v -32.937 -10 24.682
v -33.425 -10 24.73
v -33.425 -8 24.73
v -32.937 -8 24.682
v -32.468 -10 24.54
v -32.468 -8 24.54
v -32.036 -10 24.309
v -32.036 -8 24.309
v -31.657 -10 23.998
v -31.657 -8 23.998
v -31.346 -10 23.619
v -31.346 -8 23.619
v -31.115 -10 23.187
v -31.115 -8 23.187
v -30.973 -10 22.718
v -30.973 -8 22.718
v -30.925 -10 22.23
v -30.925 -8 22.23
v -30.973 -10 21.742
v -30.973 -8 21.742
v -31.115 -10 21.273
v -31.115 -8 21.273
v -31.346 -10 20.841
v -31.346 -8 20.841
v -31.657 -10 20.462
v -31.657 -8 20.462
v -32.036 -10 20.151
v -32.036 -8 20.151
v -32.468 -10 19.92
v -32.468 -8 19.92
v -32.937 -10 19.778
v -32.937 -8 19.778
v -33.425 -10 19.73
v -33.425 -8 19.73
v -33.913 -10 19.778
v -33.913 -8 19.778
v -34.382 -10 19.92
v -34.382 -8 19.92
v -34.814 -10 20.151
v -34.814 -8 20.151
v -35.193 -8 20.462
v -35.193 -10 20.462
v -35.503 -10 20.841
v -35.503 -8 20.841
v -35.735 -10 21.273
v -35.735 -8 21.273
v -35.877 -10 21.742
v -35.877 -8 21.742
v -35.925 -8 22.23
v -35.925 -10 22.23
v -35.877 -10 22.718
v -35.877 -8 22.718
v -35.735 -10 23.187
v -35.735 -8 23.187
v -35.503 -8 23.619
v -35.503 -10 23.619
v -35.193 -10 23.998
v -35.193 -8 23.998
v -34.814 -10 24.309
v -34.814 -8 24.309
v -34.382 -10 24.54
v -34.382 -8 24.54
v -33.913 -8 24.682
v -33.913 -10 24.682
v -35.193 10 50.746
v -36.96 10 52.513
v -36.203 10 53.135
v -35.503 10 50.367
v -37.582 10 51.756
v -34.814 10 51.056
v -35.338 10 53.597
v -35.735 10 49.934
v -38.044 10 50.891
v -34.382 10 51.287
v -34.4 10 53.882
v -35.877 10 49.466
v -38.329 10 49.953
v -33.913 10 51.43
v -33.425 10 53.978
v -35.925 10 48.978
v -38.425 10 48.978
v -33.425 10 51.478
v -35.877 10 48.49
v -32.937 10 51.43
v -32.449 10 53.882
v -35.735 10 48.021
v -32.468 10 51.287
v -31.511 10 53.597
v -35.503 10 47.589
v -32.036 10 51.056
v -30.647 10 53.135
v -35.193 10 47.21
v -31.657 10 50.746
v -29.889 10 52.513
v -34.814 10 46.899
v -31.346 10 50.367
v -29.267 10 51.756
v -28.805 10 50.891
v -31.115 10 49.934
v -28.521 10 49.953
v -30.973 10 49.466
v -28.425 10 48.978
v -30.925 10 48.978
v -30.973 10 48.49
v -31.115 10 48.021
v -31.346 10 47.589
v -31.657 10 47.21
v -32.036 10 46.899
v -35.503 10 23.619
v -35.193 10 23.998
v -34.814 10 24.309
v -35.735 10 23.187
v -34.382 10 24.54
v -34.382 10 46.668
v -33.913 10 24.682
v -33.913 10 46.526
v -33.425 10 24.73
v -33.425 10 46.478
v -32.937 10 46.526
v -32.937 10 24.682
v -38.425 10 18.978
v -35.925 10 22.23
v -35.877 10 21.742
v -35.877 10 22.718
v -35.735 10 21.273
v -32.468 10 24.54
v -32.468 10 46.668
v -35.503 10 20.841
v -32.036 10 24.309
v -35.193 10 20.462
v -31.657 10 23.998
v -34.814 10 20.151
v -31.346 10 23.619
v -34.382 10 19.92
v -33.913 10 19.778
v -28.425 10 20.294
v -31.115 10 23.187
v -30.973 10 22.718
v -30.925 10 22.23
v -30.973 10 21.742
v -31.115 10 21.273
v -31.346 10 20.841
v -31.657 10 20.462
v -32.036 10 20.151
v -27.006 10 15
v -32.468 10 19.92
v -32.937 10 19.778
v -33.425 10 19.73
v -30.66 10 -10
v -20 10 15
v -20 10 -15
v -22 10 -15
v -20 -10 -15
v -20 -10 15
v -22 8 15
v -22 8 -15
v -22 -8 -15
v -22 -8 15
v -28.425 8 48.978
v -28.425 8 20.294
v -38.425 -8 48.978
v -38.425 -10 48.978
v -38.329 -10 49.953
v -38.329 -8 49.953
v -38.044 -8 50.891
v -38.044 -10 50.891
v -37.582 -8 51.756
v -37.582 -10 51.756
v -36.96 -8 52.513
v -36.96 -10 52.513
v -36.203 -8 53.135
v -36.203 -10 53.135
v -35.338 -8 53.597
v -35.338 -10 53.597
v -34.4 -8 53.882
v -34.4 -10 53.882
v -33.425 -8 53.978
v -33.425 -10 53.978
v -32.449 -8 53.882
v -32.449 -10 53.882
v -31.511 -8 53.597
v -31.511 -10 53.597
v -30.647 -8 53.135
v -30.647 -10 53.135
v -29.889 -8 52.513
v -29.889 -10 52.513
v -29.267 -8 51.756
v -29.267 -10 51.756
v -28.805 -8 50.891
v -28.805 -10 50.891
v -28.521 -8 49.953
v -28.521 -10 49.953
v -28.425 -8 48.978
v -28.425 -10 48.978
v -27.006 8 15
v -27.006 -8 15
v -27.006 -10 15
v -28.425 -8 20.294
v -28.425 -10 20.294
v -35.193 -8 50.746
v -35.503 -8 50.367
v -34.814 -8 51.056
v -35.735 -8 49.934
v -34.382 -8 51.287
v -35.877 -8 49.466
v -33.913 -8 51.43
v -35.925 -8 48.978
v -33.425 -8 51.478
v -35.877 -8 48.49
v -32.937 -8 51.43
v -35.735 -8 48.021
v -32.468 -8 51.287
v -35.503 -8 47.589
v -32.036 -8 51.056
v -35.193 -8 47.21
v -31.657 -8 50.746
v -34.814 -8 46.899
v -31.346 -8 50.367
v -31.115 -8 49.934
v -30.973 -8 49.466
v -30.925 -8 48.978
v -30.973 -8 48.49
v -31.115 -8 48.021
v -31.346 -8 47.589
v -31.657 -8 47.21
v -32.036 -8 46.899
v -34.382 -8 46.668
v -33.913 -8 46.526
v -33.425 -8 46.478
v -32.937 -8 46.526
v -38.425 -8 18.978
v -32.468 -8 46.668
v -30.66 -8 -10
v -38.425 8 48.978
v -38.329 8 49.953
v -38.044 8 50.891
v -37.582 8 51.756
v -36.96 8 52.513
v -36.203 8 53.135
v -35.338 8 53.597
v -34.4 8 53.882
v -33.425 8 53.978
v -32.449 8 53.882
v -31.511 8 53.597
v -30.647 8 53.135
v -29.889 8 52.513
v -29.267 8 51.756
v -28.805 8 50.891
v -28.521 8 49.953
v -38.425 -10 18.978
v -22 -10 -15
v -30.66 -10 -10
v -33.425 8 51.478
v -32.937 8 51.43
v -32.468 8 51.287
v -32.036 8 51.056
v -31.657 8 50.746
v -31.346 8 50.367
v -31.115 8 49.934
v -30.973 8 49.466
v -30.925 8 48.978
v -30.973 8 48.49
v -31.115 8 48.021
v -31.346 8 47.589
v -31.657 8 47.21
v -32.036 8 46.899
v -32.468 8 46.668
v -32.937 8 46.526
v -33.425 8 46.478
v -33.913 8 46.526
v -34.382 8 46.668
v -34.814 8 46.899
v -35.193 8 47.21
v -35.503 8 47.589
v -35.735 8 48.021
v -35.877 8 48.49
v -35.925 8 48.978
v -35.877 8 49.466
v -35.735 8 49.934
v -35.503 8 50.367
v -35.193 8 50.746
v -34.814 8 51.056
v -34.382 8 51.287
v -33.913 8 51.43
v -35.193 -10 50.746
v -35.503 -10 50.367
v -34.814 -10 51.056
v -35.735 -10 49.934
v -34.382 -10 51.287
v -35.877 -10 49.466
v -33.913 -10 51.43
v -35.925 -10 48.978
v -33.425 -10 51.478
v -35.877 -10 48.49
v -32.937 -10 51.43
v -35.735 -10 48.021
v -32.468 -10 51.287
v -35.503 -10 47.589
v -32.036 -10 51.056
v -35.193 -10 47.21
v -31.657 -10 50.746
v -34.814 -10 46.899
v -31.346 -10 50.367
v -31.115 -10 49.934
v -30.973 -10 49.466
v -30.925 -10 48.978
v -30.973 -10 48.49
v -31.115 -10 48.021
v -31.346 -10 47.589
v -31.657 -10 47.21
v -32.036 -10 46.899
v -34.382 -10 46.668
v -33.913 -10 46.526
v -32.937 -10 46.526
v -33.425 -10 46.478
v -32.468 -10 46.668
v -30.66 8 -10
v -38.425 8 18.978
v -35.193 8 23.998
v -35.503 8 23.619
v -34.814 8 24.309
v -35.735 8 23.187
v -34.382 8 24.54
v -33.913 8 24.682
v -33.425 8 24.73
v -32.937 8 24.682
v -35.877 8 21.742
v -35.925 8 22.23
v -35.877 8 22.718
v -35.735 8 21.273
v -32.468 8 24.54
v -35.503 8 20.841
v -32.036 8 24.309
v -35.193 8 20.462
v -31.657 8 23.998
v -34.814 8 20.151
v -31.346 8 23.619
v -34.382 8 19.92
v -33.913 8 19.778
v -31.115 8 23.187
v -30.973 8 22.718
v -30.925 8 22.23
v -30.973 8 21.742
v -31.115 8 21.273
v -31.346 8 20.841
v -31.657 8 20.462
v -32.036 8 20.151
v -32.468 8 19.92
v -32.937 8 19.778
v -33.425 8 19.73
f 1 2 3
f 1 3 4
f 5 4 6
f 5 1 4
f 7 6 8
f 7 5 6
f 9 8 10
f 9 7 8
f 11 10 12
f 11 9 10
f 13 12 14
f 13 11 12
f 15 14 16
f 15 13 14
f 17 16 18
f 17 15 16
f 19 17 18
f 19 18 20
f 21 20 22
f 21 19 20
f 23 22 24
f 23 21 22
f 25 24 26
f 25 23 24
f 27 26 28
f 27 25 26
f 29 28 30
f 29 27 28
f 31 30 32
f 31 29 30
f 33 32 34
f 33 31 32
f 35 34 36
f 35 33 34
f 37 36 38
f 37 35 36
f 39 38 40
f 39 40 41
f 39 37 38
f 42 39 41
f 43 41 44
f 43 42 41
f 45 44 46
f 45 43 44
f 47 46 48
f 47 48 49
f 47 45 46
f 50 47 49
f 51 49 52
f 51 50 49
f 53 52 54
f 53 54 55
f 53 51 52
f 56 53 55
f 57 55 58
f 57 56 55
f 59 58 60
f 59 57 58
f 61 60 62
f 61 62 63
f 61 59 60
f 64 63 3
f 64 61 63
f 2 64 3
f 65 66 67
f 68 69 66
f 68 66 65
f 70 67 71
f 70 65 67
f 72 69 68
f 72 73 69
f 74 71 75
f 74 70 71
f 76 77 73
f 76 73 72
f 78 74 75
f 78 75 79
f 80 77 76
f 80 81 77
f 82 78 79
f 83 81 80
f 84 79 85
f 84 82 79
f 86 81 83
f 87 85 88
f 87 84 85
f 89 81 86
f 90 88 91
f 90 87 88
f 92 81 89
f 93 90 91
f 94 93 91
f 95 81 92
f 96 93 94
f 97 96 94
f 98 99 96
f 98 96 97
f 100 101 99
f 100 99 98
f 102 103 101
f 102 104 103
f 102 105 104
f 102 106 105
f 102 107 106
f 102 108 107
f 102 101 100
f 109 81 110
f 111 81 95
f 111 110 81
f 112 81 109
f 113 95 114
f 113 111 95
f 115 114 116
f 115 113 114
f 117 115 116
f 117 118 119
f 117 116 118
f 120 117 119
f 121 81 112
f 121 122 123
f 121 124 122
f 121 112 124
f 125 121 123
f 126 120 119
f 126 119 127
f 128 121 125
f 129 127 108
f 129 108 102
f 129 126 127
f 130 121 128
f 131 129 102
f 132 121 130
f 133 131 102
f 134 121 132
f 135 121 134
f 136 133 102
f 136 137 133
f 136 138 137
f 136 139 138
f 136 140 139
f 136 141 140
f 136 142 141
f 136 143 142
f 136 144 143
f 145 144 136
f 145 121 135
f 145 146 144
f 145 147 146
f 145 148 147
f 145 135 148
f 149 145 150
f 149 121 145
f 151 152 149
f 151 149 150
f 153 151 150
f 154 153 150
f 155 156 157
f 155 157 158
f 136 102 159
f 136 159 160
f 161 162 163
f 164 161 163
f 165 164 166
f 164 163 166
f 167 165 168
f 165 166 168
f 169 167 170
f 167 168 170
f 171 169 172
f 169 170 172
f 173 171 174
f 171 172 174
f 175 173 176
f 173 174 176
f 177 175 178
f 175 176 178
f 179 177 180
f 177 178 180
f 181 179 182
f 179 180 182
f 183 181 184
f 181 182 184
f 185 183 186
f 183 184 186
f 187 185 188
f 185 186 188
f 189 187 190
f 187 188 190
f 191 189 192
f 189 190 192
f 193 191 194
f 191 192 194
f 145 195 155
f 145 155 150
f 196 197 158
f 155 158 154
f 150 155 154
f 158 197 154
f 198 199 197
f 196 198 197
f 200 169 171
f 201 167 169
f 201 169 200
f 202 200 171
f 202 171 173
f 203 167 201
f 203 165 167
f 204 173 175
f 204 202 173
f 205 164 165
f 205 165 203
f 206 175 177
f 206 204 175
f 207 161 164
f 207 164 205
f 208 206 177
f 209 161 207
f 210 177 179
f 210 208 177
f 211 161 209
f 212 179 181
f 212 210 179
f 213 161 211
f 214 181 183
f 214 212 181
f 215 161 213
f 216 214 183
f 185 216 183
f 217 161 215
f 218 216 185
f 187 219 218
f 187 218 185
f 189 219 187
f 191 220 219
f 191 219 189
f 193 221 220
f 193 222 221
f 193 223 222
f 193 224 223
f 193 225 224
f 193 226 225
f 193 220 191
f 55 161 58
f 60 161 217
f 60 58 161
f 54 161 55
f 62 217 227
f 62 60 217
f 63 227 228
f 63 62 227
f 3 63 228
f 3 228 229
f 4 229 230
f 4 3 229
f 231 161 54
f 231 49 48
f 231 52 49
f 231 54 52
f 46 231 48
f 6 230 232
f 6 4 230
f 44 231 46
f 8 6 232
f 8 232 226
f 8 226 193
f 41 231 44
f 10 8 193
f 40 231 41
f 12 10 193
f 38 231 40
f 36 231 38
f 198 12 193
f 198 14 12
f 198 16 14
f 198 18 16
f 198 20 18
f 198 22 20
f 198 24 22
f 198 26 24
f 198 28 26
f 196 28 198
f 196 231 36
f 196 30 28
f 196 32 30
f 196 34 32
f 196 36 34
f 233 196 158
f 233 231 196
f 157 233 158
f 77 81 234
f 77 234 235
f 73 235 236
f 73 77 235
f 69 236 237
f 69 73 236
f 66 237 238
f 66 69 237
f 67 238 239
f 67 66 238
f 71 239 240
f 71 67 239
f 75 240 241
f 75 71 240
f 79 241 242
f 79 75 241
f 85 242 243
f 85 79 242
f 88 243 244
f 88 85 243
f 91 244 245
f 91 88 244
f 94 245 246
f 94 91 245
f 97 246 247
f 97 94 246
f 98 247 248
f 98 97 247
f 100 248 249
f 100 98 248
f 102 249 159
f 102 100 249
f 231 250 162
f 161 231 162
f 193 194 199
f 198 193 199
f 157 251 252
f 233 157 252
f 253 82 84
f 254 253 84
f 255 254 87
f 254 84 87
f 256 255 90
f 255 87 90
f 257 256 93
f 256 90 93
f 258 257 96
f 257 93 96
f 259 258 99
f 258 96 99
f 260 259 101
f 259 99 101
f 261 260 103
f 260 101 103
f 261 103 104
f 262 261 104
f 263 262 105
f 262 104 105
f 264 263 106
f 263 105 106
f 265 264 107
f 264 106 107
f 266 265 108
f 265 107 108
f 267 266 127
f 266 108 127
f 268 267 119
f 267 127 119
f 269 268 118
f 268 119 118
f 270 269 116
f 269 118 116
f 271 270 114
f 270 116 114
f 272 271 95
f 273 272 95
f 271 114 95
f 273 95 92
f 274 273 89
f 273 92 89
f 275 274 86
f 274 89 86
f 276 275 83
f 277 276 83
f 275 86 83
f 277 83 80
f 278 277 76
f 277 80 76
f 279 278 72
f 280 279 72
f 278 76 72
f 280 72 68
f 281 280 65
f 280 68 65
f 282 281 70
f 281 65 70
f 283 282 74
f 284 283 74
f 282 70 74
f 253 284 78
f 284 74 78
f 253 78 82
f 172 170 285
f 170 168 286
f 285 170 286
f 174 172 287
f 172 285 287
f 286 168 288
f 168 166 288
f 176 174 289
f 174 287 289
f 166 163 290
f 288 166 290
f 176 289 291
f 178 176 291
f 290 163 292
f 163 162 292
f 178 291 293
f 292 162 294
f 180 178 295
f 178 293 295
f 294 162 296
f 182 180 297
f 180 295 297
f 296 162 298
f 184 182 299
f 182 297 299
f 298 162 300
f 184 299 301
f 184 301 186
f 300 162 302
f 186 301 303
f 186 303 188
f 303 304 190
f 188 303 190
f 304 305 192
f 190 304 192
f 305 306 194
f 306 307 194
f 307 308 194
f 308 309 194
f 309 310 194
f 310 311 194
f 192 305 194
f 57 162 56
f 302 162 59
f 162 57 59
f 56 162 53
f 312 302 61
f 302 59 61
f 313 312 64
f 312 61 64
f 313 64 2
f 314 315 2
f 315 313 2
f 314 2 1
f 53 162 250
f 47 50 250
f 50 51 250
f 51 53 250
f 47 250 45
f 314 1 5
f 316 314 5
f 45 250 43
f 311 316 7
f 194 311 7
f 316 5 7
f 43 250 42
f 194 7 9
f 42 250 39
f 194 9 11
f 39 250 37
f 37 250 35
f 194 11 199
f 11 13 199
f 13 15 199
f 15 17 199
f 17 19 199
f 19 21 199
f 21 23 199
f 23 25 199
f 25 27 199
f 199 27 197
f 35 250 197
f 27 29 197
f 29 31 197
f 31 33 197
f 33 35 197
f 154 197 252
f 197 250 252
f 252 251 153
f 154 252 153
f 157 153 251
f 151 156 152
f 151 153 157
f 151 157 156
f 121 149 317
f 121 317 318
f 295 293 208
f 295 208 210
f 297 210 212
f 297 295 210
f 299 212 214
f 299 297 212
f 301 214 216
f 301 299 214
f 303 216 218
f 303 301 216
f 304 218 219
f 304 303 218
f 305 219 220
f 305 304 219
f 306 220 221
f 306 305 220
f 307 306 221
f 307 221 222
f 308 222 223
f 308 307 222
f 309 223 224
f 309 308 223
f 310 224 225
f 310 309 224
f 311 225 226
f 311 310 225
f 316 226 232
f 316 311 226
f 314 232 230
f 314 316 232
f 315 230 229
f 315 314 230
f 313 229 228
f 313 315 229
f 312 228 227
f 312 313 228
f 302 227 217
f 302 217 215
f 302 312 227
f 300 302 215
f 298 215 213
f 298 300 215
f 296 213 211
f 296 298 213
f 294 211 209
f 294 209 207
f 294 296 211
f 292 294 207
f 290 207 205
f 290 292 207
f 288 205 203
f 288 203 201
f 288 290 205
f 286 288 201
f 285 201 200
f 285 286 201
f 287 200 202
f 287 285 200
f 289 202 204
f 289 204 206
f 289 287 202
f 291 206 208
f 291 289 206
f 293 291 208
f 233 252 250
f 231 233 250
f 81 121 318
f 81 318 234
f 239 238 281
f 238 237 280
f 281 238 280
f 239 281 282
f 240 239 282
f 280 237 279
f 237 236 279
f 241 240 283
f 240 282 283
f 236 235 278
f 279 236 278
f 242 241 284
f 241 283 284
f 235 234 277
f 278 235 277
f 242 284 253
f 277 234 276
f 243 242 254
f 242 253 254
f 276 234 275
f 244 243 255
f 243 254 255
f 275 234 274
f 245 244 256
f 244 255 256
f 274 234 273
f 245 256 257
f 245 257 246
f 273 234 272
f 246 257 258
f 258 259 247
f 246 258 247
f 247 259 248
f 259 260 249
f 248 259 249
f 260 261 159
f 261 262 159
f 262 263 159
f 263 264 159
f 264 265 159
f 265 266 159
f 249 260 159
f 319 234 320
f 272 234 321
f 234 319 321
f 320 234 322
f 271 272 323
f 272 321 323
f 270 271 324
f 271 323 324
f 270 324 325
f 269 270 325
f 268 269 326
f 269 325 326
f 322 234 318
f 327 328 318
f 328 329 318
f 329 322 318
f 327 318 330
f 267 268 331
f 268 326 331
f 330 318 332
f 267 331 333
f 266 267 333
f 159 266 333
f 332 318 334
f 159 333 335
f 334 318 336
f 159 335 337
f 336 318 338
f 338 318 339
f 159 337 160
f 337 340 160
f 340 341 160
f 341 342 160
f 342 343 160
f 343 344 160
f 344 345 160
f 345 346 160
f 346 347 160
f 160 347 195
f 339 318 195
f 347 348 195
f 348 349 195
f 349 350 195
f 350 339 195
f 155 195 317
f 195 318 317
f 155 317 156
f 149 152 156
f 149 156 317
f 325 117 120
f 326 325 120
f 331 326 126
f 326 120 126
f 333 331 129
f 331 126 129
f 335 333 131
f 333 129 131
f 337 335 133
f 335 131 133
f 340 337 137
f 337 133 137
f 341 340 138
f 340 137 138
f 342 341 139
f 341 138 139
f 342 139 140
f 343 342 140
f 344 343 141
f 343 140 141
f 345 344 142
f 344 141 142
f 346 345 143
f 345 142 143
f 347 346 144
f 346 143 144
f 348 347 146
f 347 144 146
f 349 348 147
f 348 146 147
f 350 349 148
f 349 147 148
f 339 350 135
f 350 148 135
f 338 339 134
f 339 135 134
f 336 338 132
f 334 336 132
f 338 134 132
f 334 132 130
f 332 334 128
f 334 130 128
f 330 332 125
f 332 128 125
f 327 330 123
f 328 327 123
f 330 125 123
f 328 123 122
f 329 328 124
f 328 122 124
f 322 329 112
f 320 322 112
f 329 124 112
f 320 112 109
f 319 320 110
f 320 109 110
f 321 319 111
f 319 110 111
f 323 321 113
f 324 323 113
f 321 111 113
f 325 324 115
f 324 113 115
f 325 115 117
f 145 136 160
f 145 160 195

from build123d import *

# Parameters (mm, degrees)
SKETCH2_W           = 30
SKETCH2_H           = 20
BOSS_EXTRUDE1_DEPTH = 2
SKETCH3_R           = 2.5
BOSS_EXTRUDE2_DEPTH = 2


with BuildPart() as part:
    # Sketch2 → Boss-Extrude1 (new body)
    with BuildSketch(Plane.ZY.offset(20)):
        Rectangle(SKETCH2_W, SKETCH2_H)
    extrude(amount=BOSS_EXTRUDE1_DEPTH)

    # Sketch3 → Boss-Extrude2 (add)
    with BuildSketch(Plane(origin=(0, 10, 0), x_dir=(1, 0, 0), z_dir=(0, 1, 0))):
        with BuildLine():
            Line((-22, -15), (-22, 15))
            Line((-22, 15), (-30.660254038, 10))
            Line((-30.660254038, 10), (-38.424825391, -18.977774789))
            Line((-38.424825391, -18.977774789), (-38.424825391, -48.977774789))
            ThreePointArc((-38.424825391, -48.977774789), (-33.424825391, -53.977774789), (-28.424825391, -48.977774789))
            Line((-28.424825391, -48.977774789), (-28.424825391, -20.294299765))
            Line((-28.424825391, -20.294299765), (-27.006222045, -15))
            Line((-27.006222045, -15), (-22, -15))
        make_face()
        with Locations(Location((-33.424825391, -48.977774789, 0), (0, 0, 270))):
            Circle(SKETCH3_R, mode=Mode.SUBTRACT)
        with Locations(Location((-33.424825391, -22.229962666, 0), (0, 0, 270))):
            Circle(SKETCH3_R, mode=Mode.SUBTRACT)
    boss_extrude2 = extrude(amount=-BOSS_EXTRUDE2_DEPTH)

    # Mirror1: Boss-Extrude2 across plane
    add(boss_extrude2.mirror(Plane(origin=(0, 0, 0), x_dir=(0, 0, 1), z_dir=(0, -1, 0))))


solid = part.part
